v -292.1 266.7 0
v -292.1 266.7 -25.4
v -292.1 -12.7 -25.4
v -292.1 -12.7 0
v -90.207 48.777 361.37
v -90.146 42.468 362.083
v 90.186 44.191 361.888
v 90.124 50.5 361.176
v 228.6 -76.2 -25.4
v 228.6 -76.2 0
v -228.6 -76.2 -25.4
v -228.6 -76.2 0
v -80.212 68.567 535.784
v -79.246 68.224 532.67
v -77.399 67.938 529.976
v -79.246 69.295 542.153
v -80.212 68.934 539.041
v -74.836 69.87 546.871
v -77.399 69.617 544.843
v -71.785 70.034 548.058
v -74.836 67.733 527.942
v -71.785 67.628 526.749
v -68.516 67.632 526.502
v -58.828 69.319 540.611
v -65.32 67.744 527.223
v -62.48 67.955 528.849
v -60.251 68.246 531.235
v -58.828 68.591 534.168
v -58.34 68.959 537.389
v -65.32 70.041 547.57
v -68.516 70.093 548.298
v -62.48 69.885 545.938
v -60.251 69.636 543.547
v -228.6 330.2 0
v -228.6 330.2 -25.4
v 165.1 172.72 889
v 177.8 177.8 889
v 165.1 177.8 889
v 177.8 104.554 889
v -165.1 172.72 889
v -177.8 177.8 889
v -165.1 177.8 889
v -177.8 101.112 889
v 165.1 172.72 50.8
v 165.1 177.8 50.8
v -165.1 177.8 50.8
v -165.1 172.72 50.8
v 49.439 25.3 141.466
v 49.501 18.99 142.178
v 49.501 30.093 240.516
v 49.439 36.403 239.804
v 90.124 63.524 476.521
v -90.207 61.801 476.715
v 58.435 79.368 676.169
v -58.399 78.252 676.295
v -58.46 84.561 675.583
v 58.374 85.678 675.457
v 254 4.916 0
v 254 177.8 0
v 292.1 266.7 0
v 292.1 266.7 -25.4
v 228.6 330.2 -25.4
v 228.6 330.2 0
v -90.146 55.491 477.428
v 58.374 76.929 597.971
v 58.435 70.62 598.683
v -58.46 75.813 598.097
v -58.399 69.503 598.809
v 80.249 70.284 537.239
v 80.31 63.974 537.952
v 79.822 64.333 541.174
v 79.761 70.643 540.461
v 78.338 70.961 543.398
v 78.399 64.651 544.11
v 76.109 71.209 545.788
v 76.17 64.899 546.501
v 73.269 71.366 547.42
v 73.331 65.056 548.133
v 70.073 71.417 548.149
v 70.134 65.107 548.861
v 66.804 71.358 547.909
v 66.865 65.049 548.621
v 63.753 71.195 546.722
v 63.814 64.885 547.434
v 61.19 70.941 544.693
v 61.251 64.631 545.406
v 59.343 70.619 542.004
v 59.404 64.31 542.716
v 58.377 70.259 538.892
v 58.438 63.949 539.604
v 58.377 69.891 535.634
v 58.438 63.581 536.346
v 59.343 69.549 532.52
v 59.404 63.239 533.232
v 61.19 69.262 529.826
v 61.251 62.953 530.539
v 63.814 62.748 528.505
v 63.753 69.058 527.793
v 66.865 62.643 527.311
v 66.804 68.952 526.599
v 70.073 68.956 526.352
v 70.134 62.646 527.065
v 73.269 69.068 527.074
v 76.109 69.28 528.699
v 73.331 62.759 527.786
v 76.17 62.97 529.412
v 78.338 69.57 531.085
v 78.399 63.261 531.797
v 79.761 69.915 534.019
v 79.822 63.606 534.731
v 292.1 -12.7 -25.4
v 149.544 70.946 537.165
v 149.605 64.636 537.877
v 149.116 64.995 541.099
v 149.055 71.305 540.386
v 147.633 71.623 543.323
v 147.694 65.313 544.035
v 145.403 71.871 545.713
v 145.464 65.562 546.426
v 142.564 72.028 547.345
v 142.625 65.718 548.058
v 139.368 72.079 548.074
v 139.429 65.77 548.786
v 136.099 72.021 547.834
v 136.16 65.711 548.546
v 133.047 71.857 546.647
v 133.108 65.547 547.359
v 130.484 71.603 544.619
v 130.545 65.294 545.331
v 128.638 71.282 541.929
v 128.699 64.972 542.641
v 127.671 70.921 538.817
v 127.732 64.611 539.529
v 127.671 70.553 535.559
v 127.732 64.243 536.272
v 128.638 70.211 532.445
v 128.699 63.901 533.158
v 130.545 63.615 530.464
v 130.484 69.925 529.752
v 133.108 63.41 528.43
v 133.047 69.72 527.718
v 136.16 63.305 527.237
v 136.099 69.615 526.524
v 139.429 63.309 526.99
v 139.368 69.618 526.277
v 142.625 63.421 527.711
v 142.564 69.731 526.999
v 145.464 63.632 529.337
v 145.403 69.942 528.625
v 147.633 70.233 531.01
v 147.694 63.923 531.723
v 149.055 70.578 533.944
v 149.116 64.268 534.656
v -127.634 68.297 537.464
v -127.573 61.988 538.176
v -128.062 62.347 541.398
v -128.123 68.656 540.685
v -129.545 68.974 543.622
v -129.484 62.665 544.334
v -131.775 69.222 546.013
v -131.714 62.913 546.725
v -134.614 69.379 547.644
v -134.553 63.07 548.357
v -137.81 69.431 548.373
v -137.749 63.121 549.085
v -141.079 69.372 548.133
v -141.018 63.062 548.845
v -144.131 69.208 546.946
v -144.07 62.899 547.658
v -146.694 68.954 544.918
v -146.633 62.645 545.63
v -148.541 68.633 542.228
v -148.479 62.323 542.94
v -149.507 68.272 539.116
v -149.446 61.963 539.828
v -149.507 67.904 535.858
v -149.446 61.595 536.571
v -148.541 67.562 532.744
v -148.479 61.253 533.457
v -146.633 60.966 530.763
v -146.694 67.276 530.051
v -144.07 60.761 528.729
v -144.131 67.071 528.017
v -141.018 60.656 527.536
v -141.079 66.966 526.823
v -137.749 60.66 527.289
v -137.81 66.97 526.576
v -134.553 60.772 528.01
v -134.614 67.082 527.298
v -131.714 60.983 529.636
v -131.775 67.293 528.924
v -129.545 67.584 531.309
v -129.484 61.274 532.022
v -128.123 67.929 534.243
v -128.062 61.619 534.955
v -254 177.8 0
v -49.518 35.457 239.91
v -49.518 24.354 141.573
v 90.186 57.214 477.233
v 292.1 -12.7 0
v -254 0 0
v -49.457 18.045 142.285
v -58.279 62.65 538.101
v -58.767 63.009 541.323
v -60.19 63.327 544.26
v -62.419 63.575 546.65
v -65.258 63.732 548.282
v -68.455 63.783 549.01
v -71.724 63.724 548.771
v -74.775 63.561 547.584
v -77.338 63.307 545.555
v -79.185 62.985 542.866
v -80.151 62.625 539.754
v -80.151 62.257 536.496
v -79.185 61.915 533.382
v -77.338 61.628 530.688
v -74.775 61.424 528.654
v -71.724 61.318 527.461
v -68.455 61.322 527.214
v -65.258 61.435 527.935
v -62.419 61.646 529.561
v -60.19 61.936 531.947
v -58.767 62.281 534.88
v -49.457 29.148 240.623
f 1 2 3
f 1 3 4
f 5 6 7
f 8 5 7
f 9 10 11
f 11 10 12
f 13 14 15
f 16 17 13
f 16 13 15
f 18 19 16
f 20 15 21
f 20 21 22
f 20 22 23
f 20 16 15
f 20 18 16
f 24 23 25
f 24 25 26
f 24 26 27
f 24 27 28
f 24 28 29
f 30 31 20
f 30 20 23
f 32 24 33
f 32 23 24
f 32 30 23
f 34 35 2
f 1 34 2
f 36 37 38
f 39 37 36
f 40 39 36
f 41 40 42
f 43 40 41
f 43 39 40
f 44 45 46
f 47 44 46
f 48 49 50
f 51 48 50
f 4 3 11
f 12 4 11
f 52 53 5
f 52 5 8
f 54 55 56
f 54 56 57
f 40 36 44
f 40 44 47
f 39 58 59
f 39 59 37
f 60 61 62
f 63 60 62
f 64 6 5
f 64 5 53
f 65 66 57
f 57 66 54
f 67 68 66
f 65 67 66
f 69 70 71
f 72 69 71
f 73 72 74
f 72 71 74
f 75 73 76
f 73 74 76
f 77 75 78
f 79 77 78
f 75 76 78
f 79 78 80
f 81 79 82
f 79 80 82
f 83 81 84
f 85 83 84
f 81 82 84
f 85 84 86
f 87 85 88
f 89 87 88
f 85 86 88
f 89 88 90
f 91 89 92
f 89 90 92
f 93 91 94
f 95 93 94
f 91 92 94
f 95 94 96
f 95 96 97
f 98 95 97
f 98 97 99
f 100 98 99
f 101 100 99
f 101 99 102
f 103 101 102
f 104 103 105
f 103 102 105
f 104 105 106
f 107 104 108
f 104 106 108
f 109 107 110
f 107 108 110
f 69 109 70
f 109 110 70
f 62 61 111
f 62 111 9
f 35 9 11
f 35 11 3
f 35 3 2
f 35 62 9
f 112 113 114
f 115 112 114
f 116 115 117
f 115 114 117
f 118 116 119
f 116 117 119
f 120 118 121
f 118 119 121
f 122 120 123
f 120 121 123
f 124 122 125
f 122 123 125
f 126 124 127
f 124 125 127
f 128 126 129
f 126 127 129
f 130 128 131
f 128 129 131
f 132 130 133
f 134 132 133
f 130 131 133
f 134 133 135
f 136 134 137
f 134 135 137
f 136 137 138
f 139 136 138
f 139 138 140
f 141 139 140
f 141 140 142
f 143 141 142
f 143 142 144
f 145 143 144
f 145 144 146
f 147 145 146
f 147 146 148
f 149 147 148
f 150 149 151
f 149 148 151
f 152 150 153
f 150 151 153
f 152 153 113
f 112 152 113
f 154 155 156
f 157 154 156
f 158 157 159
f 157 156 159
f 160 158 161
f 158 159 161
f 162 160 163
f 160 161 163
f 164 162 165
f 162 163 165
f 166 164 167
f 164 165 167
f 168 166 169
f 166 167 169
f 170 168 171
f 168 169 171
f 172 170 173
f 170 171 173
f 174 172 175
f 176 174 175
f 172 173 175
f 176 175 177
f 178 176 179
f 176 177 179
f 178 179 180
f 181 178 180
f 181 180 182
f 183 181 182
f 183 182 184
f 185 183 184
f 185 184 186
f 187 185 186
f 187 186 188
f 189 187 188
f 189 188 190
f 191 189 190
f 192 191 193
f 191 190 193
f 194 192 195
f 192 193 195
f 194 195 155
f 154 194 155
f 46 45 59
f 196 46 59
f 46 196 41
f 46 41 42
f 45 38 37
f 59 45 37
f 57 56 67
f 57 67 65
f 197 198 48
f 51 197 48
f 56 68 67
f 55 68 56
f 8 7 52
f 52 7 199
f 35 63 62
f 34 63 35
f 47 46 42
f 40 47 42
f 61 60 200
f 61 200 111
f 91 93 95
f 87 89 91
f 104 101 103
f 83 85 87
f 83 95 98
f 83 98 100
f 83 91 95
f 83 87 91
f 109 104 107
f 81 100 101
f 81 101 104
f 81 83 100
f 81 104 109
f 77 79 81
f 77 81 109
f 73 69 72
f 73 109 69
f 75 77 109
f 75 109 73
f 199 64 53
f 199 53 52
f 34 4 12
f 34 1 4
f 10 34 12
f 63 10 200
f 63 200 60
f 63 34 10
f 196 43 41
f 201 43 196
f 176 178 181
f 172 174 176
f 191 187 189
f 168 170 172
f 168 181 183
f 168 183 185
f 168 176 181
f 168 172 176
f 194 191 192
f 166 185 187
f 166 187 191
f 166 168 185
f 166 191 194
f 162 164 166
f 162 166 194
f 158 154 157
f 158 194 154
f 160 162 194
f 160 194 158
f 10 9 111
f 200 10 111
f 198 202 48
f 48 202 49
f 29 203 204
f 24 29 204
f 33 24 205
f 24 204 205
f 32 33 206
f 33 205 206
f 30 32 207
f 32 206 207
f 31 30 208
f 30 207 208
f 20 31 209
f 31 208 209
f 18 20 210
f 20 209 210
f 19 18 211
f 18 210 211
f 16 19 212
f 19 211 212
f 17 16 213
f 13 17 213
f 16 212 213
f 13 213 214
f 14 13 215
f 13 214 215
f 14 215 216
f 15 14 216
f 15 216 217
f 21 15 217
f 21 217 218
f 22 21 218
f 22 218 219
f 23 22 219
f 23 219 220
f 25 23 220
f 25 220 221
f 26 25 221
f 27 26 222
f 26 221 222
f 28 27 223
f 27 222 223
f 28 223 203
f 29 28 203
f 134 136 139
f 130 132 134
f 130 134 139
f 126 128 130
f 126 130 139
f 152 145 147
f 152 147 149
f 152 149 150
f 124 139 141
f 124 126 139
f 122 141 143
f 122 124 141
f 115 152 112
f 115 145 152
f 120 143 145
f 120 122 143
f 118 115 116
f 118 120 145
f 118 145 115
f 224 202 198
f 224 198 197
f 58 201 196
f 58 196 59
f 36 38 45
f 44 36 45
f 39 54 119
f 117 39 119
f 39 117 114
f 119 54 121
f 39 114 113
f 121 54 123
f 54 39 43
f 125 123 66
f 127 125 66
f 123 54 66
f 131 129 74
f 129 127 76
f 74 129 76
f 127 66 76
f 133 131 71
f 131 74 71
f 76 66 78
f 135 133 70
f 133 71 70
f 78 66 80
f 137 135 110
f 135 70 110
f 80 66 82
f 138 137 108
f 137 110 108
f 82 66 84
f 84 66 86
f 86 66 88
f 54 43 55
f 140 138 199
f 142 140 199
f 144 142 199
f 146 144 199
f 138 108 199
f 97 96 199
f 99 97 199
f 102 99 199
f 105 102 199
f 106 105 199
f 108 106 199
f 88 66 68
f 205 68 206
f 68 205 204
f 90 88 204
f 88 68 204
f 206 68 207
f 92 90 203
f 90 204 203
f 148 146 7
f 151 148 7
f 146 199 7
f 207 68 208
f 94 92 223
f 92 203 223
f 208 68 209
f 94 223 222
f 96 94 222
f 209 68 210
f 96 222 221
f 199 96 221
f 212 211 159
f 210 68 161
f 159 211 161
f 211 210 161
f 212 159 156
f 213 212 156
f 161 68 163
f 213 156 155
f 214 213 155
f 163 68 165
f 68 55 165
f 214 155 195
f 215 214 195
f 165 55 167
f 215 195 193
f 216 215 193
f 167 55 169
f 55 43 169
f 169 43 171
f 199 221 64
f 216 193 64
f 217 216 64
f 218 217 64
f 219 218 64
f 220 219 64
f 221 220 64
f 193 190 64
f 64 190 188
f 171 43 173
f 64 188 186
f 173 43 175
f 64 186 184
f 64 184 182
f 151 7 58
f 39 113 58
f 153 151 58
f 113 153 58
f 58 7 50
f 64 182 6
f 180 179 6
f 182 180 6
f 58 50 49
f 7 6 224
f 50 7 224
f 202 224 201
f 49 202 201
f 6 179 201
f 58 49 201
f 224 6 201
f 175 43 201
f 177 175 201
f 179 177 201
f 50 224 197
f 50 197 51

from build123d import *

# Parameters (mm, degrees)
F1_DEPTH      = 177.8
F3_DEPTH      = 506.1450977132
F5_DEPTH      = 152.4
F5_DEPTH_BACK = 254
F6_W          = 304.8
F6_H          = 825.5
F7_DEPTH      = 5.08
F9_DEPTH      = 25.4
F10_W         = 116.84
F10_H         = 77.978
F10_W_2       = 180.34
F10_H_2       = 116.078
F10_W_3       = 98.9624224542
F10_H_3       = 98.9624224542
F10_R         = 10.9982
F11_DEPTH     = 6.35


with BuildPart() as f1:
    # F0 (on Front) → F1 (new body)
    with BuildSketch(Plane.XZ):
        Polygon((-177.8, 889), (-254, 0), (254, 0), (177.8, 889), (0, 889), align=None)
    extrude(amount=-F1_DEPTH)

    # F2 (on face) → F3 (cut, through all)
    with BuildSketch(Plane(origin=(-252.1474878444, 0, 21.6126418152), x_dir=(0, -1, 0), z_dir=(-0.996346649, 0, 0.0854011413))):
        Polygon((-101.1122888841, 870.5678480667), (0, -21.691889902), (0, 870.5678480667), align=None)
        Polygon((-101.1122888841, 870.5678480667), (0, 870.5678480667), (0, 1635.8699123508), (-187.8375327953, 1635.8699123508), align=None)
    extrude(amount=-F3_DEPTH, mode=Mode.SUBTRACT)

    # F6 (on face) → F7 (cut)
    with BuildSketch(Plane(origin=(0, 177.8, 0), x_dir=(-1, 0, 0), z_dir=(0, 1, 0))):
        Polygon((-152.4, 889), (-165.1, 889), (-165.1, 50.8), (165.1, 50.8), (165.1, 889), (152.4, 889), (152.4, 63.5), (-152.4, 63.5), align=None)
        with Locations((0, 476.25)):
            Rectangle(F6_W, F6_H)
    extrude(amount=-F7_DEPTH, mode=Mode.SUBTRACT)

    # F10 (on face) → F11 (cut)
    with BuildSketch(Plane(origin=(-0.0234879302, 2.4269924652, -0.2740258526), x_dir=(0.9999537628, 0.0095555303, -0.0010788918), z_dir=(0.0096162449, -0.9936402964, 0.112189524))):
        with Locations((0.0416195213, 641.8154632217)):
            Rectangle(F10_W, F10_H)
        with Locations((0.0431962705, 422.6001270233)):
            Rectangle(F10_W_2, F10_H_2)
        with Locations((0.0450731424, 192.8925795978)):
            Rectangle(F10_W_3, F10_H_3)
        with Locations((69.3393310898, 541.7327951225)):
            Circle(F10_R)
        with Locations((138.6370426584, 541.7327951225)):
            Circle(F10_R)
        with Locations((-138.5538036159, 541.7327951225)):
            Circle(F10_R)
        with Locations((-69.2560920473, 541.7327951225)):
            Circle(F10_R)
    extrude(amount=-F11_DEPTH, mode=Mode.SUBTRACT)


with BuildPart() as f5:
    # F4 (on face) → F5 (new body, two sides)
    with BuildSketch(Plane(origin=(0, 177.8, 0), x_dir=(-1, 0, 0), z_dir=(0, 1, 0))) as f5_sk:
        Polygon((254, 0), (-254, 0), (-292.1, 0), (-292.1, -25.4), (292.1, -25.4), (292.1, 0), align=None)
    extrude(amount=F5_DEPTH)
    extrude(f5_sk.sketch, amount=-F5_DEPTH_BACK)

    # F8 (on face) → F9 (cut)
    with BuildSketch(Plane(origin=(0, 0, -25.4), x_dir=(1, 0, 0), z_dir=(0, 0, -1))):
        Polygon((-292.1, 12.7), (-228.6, 76.2), (-292.1, 76.2), align=None)
        Polygon((-228.6, -330.2), (-292.1, -266.7), (-292.1, -330.2), align=None)
        Polygon((292.1, 76.2), (228.6, 76.2), (292.1, 12.7), align=None)
        Polygon((292.1, -330.2), (292.1, -266.7), (228.6, -330.2), align=None)
    extrude(amount=-F9_DEPTH, mode=Mode.SUBTRACT)


solid = Compound([f1.part, f5.part])
